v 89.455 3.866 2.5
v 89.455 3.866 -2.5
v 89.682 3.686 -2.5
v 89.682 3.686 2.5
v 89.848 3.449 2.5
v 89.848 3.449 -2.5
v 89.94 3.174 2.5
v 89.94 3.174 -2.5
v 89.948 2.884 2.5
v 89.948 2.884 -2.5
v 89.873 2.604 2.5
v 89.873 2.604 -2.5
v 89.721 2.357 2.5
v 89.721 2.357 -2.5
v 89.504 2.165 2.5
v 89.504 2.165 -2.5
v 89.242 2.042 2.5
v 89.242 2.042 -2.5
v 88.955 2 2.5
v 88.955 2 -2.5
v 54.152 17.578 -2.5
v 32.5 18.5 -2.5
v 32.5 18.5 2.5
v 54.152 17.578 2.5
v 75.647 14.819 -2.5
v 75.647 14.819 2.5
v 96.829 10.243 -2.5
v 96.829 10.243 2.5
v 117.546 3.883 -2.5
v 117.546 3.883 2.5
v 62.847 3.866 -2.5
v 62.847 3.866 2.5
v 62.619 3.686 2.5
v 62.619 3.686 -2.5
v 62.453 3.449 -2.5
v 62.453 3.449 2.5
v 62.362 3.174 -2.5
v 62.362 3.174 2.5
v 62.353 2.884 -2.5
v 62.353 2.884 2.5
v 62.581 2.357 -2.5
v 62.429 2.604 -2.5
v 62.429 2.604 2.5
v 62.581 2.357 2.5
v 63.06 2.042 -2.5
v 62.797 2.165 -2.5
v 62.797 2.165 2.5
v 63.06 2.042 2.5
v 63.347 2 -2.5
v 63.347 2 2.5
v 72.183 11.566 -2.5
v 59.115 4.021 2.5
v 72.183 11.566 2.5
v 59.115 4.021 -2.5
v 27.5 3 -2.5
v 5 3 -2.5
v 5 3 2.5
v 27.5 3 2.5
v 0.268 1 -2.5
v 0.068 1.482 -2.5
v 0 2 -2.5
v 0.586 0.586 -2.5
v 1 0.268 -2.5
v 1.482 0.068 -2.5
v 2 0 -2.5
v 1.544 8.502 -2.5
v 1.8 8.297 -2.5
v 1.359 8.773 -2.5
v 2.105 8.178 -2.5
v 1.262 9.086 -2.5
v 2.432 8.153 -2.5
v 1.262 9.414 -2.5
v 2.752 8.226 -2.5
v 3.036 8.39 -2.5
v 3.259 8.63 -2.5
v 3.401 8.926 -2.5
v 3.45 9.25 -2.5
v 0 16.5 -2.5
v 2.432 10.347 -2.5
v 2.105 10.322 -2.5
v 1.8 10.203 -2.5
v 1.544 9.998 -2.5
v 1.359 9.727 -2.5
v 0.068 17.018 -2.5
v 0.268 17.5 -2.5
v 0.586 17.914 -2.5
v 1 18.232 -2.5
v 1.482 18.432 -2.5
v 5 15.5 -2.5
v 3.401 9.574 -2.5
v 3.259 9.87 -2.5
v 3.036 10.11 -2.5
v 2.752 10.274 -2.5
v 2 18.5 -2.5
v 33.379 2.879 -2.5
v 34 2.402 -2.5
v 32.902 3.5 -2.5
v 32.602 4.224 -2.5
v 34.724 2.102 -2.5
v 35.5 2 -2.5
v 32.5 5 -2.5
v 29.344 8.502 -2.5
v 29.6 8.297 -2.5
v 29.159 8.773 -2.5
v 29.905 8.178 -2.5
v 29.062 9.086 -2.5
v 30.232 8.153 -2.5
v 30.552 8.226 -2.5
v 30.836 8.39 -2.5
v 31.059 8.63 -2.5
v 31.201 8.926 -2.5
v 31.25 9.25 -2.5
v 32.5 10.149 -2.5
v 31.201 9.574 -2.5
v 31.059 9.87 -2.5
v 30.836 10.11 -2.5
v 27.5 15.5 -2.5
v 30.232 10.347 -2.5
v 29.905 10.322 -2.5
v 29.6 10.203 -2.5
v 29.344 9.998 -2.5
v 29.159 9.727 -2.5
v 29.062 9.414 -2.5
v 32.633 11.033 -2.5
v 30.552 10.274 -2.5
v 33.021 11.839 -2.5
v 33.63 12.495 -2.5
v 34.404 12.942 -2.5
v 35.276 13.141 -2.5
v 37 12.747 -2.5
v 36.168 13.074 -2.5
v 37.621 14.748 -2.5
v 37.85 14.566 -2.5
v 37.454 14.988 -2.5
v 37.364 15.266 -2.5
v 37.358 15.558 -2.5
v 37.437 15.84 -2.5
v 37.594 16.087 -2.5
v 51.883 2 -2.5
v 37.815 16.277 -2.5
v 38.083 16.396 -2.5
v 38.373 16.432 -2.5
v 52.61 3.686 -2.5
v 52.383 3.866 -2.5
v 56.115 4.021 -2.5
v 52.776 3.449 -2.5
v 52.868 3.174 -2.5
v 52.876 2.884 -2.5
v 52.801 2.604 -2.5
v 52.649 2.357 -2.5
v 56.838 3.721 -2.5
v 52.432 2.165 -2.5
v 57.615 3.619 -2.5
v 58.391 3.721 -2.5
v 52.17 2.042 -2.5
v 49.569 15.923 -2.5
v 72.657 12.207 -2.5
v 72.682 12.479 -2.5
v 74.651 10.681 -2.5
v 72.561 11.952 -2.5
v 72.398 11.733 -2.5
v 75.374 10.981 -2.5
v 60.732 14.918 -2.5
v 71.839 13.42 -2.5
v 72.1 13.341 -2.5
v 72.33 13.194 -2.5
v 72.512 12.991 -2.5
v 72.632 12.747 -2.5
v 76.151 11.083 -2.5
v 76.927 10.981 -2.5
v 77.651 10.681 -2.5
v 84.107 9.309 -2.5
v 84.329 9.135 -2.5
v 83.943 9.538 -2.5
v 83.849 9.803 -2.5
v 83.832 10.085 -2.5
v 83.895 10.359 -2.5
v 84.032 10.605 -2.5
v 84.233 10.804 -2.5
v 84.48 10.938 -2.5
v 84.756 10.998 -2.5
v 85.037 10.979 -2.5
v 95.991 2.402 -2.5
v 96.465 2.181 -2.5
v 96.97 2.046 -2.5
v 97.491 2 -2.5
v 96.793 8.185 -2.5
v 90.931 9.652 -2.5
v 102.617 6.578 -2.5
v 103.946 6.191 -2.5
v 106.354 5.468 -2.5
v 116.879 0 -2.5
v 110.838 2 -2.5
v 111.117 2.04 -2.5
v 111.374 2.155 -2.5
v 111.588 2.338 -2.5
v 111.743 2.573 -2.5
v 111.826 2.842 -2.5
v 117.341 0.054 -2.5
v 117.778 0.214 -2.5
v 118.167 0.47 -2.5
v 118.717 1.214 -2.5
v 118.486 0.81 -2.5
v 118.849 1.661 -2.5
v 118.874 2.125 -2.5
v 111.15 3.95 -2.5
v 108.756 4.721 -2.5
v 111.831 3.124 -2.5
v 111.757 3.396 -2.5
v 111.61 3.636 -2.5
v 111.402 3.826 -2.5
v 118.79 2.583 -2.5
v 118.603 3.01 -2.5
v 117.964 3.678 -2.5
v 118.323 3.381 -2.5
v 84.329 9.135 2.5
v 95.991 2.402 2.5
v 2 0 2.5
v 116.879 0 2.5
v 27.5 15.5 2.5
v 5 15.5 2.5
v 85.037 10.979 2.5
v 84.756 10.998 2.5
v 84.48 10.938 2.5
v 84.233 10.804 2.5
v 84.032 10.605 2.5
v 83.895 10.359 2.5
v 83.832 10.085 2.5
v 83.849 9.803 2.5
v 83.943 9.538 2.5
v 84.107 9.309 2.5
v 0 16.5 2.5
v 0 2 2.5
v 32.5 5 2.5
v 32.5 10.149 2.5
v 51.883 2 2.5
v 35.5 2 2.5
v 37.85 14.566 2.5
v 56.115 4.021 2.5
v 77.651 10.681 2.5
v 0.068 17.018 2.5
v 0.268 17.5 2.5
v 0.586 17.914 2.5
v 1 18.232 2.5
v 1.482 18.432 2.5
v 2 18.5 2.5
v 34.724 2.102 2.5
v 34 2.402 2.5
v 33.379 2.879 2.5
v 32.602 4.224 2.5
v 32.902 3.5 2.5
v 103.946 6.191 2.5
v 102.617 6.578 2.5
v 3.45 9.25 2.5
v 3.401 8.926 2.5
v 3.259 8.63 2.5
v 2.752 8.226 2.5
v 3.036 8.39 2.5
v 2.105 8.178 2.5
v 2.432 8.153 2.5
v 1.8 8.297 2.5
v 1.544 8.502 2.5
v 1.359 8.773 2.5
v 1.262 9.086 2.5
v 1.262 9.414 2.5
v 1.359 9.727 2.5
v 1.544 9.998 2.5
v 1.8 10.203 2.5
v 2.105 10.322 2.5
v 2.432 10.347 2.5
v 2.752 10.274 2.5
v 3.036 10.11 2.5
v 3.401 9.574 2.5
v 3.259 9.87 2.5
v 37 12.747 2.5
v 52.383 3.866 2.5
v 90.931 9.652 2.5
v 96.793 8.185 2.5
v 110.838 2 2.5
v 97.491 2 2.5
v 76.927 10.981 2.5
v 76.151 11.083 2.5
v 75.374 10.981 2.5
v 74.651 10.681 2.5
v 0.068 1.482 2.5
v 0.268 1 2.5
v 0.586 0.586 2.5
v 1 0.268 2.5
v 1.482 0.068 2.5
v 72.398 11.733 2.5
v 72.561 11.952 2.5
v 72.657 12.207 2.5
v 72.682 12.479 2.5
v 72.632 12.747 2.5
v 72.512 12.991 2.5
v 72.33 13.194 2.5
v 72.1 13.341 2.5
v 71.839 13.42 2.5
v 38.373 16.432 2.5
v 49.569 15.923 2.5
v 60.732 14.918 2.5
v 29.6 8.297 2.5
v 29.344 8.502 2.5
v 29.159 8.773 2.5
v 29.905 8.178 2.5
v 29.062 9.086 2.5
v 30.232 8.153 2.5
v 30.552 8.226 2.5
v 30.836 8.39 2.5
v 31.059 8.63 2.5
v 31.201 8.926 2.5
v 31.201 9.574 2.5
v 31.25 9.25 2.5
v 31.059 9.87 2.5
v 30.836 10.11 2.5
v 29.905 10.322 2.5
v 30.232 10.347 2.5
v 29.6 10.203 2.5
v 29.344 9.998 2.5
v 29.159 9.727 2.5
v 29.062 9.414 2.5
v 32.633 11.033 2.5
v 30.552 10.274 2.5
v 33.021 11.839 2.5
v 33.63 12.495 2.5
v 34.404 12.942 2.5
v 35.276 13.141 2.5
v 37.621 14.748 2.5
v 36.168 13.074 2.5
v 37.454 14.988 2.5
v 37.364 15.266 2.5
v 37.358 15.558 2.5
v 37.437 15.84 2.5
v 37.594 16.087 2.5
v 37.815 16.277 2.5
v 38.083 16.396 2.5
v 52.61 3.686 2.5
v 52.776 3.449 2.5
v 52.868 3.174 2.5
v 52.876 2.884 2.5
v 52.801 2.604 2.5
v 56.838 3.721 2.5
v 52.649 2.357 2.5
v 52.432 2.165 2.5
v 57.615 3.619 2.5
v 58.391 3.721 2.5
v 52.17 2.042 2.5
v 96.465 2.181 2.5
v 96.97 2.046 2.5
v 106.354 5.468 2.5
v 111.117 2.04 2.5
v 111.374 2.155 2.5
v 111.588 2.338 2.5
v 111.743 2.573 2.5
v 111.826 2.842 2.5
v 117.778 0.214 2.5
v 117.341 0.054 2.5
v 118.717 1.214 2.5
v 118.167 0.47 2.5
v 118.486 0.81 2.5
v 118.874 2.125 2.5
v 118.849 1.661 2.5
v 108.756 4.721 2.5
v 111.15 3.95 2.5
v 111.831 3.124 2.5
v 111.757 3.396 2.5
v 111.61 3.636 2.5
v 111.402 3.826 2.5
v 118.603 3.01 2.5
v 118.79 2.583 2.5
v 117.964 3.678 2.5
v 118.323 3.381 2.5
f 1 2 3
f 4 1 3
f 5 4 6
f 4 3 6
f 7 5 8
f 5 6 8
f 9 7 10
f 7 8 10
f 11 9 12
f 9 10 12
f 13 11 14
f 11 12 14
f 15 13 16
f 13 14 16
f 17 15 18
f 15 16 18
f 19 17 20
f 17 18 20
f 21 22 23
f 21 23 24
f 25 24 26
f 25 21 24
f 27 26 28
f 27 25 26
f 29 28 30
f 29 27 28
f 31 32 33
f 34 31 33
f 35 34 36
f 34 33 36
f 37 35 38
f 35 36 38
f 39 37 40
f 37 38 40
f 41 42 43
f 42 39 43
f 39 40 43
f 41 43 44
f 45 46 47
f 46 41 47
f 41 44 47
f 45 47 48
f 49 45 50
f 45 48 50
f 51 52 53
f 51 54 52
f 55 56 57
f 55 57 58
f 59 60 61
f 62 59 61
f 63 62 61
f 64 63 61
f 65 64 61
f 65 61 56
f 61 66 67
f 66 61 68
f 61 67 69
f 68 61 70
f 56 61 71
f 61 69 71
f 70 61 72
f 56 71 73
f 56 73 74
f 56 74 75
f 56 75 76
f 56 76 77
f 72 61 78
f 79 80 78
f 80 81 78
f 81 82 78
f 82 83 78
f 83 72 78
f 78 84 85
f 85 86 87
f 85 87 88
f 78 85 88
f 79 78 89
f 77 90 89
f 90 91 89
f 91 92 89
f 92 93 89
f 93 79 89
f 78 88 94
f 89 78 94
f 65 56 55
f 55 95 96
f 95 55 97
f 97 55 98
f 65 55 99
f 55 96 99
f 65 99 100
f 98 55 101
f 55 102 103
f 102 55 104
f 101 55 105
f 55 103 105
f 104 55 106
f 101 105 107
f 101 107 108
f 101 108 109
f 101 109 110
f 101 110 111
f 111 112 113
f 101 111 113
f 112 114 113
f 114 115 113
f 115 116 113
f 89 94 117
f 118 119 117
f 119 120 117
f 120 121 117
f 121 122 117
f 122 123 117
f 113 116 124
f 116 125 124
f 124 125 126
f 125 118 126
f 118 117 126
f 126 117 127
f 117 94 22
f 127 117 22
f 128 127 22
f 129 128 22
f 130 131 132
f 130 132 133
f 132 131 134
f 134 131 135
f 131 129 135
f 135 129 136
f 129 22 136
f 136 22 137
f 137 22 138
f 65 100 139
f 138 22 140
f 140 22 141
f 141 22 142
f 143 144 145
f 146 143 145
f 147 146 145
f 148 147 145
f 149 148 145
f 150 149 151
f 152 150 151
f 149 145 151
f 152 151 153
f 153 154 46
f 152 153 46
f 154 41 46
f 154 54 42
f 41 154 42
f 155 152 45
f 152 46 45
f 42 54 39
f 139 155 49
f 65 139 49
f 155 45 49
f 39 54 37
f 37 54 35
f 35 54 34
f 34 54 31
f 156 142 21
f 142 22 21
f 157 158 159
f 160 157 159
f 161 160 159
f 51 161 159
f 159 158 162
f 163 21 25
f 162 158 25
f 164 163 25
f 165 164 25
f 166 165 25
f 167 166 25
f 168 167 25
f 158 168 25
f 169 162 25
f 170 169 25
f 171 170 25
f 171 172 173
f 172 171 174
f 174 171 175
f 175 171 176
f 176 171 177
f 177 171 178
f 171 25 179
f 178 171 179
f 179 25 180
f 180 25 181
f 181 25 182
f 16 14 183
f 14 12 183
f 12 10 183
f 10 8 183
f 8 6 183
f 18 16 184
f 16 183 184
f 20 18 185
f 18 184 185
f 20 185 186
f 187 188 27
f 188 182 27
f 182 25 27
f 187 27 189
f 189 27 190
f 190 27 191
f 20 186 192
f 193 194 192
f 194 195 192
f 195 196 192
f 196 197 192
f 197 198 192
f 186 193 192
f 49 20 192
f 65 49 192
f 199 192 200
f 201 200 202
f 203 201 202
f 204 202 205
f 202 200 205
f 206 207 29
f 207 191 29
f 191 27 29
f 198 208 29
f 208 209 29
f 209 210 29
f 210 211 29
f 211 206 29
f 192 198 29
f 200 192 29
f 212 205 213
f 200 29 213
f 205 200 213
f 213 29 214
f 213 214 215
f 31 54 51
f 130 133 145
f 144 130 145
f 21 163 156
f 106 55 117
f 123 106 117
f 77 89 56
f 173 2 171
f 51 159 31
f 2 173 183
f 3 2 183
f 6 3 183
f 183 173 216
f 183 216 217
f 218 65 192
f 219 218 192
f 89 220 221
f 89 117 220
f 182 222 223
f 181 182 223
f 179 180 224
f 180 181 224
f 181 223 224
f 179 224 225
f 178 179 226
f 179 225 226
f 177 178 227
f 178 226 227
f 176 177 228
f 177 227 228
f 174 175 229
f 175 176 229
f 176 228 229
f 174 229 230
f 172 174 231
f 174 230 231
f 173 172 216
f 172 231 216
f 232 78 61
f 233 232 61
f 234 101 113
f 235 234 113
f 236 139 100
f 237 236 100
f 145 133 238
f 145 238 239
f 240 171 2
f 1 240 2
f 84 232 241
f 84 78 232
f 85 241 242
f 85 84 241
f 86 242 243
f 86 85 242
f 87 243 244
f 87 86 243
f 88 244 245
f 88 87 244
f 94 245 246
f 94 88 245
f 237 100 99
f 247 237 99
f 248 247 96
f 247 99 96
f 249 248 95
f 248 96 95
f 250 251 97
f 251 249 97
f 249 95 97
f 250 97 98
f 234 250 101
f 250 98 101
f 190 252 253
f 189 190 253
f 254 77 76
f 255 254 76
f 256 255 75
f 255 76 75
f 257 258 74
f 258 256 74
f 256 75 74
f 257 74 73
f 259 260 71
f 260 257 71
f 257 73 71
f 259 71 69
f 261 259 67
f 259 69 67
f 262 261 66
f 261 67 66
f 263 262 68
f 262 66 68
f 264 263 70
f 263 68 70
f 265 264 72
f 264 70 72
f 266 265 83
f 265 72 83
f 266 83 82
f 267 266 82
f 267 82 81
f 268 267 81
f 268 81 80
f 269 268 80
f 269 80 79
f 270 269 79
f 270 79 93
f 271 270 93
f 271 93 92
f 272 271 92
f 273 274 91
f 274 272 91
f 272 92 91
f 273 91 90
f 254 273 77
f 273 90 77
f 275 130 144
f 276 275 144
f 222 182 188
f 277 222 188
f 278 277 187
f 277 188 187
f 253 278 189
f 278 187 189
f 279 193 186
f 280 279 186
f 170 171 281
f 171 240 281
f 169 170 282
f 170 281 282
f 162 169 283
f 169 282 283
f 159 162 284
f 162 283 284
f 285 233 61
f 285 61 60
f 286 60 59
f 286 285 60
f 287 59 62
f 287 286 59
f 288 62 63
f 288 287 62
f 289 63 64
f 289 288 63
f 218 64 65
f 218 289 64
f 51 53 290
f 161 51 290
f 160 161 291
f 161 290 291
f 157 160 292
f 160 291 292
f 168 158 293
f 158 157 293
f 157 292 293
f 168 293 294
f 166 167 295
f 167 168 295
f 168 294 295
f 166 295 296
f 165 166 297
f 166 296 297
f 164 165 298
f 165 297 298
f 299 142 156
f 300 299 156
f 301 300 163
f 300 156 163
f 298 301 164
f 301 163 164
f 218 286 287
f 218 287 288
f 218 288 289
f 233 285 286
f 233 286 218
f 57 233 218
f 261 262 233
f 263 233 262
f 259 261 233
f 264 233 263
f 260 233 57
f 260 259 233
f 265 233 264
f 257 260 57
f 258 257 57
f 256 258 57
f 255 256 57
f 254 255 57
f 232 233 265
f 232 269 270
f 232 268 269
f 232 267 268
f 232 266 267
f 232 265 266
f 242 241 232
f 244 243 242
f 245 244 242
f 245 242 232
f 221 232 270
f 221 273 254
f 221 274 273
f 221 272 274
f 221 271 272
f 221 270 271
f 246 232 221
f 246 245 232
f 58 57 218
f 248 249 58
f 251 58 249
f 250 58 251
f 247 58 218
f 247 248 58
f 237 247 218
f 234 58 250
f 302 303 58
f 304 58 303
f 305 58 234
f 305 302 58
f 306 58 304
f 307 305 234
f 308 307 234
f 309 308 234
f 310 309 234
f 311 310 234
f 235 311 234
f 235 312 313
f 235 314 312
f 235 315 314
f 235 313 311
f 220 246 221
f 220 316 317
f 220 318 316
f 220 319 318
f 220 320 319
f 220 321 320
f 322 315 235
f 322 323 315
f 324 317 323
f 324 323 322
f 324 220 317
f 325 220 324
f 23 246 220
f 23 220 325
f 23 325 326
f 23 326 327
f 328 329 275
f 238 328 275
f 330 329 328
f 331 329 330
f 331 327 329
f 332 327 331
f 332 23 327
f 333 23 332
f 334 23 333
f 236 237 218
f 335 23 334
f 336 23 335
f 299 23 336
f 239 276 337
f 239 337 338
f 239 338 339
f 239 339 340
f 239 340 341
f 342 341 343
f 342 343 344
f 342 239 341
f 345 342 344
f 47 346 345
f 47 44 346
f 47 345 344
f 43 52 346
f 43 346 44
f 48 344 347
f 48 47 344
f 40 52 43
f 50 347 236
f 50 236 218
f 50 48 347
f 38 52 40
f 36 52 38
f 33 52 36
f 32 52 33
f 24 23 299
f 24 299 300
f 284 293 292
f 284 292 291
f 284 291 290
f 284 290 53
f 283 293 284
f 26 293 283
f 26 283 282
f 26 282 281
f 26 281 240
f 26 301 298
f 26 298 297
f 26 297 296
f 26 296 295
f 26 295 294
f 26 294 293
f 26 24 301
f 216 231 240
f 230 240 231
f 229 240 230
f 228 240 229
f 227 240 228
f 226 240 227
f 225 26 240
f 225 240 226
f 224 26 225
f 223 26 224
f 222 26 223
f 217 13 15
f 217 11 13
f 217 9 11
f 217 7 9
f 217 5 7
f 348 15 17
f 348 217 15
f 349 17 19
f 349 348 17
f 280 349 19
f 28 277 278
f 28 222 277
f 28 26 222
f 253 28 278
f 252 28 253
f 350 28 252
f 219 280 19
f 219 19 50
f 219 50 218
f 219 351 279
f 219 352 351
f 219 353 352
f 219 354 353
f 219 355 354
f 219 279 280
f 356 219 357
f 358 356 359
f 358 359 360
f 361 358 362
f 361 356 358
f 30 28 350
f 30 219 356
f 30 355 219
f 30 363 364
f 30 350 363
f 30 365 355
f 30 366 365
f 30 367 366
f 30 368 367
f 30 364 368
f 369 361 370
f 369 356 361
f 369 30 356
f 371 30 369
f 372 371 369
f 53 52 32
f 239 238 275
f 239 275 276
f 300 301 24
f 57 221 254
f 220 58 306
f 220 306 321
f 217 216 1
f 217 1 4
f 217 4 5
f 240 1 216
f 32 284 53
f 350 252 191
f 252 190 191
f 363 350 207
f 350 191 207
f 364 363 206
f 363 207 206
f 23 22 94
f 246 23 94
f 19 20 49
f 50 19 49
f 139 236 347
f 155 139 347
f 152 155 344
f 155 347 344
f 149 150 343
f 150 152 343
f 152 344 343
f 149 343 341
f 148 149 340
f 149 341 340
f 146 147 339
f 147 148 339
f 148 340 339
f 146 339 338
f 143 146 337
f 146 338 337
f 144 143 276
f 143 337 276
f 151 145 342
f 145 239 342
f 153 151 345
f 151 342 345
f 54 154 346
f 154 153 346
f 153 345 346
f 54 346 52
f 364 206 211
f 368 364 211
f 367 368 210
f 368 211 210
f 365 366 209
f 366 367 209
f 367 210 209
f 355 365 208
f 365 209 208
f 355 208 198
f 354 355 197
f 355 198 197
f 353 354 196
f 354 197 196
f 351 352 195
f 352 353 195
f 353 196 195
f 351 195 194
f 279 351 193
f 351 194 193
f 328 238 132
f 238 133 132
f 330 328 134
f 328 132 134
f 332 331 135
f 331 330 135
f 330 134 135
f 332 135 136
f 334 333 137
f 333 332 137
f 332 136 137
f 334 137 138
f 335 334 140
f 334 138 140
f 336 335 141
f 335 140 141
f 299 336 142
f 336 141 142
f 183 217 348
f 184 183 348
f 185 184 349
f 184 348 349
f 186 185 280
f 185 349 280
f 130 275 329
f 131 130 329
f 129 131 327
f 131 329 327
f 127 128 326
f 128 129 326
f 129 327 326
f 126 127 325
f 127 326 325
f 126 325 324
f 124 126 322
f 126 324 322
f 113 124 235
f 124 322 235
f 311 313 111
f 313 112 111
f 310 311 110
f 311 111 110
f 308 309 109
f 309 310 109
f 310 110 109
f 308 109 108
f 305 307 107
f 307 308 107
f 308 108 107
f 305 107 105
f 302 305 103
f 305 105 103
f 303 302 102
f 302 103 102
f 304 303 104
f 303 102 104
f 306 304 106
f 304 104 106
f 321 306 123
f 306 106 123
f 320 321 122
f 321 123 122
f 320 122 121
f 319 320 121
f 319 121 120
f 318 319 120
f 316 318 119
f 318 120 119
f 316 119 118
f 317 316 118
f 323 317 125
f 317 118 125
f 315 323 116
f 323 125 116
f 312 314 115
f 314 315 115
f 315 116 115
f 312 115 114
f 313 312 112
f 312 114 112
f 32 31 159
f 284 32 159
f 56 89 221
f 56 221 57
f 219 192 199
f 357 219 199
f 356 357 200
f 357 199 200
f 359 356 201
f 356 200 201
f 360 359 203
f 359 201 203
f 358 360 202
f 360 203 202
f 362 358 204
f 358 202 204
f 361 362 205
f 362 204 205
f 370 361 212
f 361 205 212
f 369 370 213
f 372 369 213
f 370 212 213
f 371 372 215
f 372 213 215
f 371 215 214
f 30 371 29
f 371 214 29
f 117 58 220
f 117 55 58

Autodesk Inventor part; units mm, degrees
ref_plane "YZ Plane" through (0, 0, 0) normal (1, 0, 0) x (0, 1, 0)
ref_plane "XZ Plane" through (0, 0, 0) normal (0, 1, 0) x (-1, 0, 0)
ref_plane "XY Plane" through (0, 0, 0) normal (0, 0, 1) x (1, 0, 0)
sketch "Sketch1" plane through (0, 0, 0) normal (0, 0, 1) x (1, 0, 0)
  line L0 (0, 0) -> (32.5, 0)
  line L1 (32.5, 0) -> (32.5, 18.5)
  line L2 (32.5, 18.5) -> (0, 18.5)
  line L3 (0, 18.5) -> (0, 0)
  line L4 (5, 3) -> (27.5, 3)
  line L5 (27.5, 3) -> (27.5, 15.5)
  line L6 (27.5, 15.5) -> (5, 15.5)
  line L7 (5, 15.5) -> (5, 3)
  line L8 (27.5, 9.25) -> (32.5, 9.25) construction
  line L9 (5, 9.25) -> (0, 9.25) construction
  line L10 (16.25, 18.5) -> (16.25, 15.5) construction
  line L11 (16.25, 3) -> (16.25, 0) construction
  circle A0 centre (2.35, 9.25) radius 1.1
  circle A1 centre (30.15, 9.25) radius 1.1
  line L12 (32.5, 0) -> (120, 0)
  line L13 (120, 0) -> (120, 3)
  arc A2 (120, 3) -> (32.5, 18.5) centre (32.5, -236.2258) ccw
  arc A3 (116.873, 2) -> (32.5, 16.5) centre (32.5, -236.2258) ccw
  line L14 (116.873, 2) -> (32.5, 2)
  line L15 (32.5, 16.5) -> (57.6147, 2)
  line L16 (57.6147, 2) -> (76.1508, 12.7018)
  line L17 (76.1508, 12.7018) -> (94.6868, 2)
  line L18 (94.6868, 2) -> (102.617, 6.5785) construction
  line L19 (102.617, 6.5785) -> (94.6868, 2) construction
  line L20 (94.6868, 2) -> (94.1868, 2.866) construction
  line L21 (94.1868, 2.866) -> (102.117, 7.4445) construction
  line L22 (102.117, 7.4445) -> (102.617, 6.5785) construction
  line L23 (94.6868, 2) -> (76.1508, 12.7018)
  line L24 (76.1508, 12.7018) -> (76.6508, 13.5678)
  line L25 (76.6508, 13.5678) -> (96.6868, 2)
  line L26 (76.1508, 12.7018) -> (57.6147, 2)
  line L27 (57.6147, 2) -> (57.1147, 2.866)
  line L28 (57.1147, 2.866) -> (75.6508, 13.5678)
  line L29 (75.6508, 13.5678) -> (76.1508, 12.7018)
  line L30 (57.6147, 2) -> (32.5, 16.5)
  line L31 (32.5, 16.5) -> (33, 17.366)
  line L32 (33, 17.366) -> (58.1147, 2.866)
  line L33 (58.1147, 2.866) -> (57.6147, 2)
  line L34 (94.6868, 2) -> (95.1868, 1.134) construction
  line L35 (95.1868, 1.134) -> (103.117, 5.7125) construction
  line L36 (103.117, 5.7125) -> (103.9456, 6.1909) construction
  line L37 (76.1508, 12.7018) -> (75.6508, 11.8358)
  line L38 (75.6508, 11.8358) -> (92.6868, 2)
  line L39 (92.6868, 2) -> (94.6868, 2)
  line L40 (57.6147, 2) -> (58.1147, 1.134)
  line L41 (58.1147, 1.134) -> (76.6508, 11.8358)
  line L42 (76.6508, 11.8358) -> (76.1508, 12.7018)
  line L43 (32.5, 16.5) -> (32, 15.634)
  line L44 (32, 15.634) -> (57.1147, 1.134)
  line L45 (57.1147, 1.134) -> (57.6147, 2)
  line L46 (103.9456, 6.1909) -> (102.617, 6.5785)
  point P0 (32.5, 16.5)
  point P1 (101.2792, 6.9608)
  point P2 (94.6868, 3.1547)
  point P3 (79.0671, 12.1727)
  point P4 (74.6102, 12.967)
  point P5 (57.6147, 3.1547)
  point P6 (34.5139, 16.492)
  point P7 (32.5, 15.3453)
  point P8 (55.6147, 2)
  point P9 (59.6147, 2)
  point P10 (76.1508, 11.5471)
  point P11 (92.6868, 2)
  point P12 (96.6868, 2)
  dimension "d8" = 5
  dimension "d10" = 3
  dimension "d11" = 22.5
  dimension "d13" = 12.5
  dimension "d14" = 2.65
  dimension "d16" = 2.2
  dimension "d17" = 120
  dimension "d18" = 3
  dimension "d23" = 2
  dimension "d73" = 30
  dimension "d74" = 30
  dimension "d75" = 30
  dimension "d76" = 30
  dimension "d77" = 1
extrude "Extrusion1" add sketch "Sketch1" along normal mid plane 5 contours L3 L2 L1 L43 L44 L0 | L1 L14 L44 L45 L40 L41 A3 L25 L24 L29 L28 L32 L31 A2 L13 L12 | L44 L43 L1 | L1 L15 L14 L44 | L14 L45 L44 | L31 L32 A3 | A3 L32 L28 L27 L15 | L16 L37 L38 L41 L14 | L33 L32 L28 A3 L16 | L27 L28 L32 L33 | L14 L41 L40 | L24 L25 A3 | A3 L25 L14 L17 | A3 L28 L29 | L42 L41 L38 L37 | L17 L14 L38 L41 L42
fillet "Fillet3" radius 2 4 edges at (0, 18.5, 0) (0, 0, 0) (120, 0, 0) (120, 3, 0)
fillet "Fillet5" radius 3 5 edges at (76.1508, 11.5471, 0) (32.5, 15.3453, 0) (57.6147, 3.1547, 0) (96.6868, 2, 0) (32.5, 2, 0)
fillet "Fillet5" radius 1 7 edges at (116.873, 2, 0) (92.6868, 2, 0) (79.0671, 12.1727, 0) (34.5139, 16.492, 0) (74.6102, 12.967, 0) (59.6147, 2, 0) (55.6147, 2, 0)
properties part number "foot_v0.1"
